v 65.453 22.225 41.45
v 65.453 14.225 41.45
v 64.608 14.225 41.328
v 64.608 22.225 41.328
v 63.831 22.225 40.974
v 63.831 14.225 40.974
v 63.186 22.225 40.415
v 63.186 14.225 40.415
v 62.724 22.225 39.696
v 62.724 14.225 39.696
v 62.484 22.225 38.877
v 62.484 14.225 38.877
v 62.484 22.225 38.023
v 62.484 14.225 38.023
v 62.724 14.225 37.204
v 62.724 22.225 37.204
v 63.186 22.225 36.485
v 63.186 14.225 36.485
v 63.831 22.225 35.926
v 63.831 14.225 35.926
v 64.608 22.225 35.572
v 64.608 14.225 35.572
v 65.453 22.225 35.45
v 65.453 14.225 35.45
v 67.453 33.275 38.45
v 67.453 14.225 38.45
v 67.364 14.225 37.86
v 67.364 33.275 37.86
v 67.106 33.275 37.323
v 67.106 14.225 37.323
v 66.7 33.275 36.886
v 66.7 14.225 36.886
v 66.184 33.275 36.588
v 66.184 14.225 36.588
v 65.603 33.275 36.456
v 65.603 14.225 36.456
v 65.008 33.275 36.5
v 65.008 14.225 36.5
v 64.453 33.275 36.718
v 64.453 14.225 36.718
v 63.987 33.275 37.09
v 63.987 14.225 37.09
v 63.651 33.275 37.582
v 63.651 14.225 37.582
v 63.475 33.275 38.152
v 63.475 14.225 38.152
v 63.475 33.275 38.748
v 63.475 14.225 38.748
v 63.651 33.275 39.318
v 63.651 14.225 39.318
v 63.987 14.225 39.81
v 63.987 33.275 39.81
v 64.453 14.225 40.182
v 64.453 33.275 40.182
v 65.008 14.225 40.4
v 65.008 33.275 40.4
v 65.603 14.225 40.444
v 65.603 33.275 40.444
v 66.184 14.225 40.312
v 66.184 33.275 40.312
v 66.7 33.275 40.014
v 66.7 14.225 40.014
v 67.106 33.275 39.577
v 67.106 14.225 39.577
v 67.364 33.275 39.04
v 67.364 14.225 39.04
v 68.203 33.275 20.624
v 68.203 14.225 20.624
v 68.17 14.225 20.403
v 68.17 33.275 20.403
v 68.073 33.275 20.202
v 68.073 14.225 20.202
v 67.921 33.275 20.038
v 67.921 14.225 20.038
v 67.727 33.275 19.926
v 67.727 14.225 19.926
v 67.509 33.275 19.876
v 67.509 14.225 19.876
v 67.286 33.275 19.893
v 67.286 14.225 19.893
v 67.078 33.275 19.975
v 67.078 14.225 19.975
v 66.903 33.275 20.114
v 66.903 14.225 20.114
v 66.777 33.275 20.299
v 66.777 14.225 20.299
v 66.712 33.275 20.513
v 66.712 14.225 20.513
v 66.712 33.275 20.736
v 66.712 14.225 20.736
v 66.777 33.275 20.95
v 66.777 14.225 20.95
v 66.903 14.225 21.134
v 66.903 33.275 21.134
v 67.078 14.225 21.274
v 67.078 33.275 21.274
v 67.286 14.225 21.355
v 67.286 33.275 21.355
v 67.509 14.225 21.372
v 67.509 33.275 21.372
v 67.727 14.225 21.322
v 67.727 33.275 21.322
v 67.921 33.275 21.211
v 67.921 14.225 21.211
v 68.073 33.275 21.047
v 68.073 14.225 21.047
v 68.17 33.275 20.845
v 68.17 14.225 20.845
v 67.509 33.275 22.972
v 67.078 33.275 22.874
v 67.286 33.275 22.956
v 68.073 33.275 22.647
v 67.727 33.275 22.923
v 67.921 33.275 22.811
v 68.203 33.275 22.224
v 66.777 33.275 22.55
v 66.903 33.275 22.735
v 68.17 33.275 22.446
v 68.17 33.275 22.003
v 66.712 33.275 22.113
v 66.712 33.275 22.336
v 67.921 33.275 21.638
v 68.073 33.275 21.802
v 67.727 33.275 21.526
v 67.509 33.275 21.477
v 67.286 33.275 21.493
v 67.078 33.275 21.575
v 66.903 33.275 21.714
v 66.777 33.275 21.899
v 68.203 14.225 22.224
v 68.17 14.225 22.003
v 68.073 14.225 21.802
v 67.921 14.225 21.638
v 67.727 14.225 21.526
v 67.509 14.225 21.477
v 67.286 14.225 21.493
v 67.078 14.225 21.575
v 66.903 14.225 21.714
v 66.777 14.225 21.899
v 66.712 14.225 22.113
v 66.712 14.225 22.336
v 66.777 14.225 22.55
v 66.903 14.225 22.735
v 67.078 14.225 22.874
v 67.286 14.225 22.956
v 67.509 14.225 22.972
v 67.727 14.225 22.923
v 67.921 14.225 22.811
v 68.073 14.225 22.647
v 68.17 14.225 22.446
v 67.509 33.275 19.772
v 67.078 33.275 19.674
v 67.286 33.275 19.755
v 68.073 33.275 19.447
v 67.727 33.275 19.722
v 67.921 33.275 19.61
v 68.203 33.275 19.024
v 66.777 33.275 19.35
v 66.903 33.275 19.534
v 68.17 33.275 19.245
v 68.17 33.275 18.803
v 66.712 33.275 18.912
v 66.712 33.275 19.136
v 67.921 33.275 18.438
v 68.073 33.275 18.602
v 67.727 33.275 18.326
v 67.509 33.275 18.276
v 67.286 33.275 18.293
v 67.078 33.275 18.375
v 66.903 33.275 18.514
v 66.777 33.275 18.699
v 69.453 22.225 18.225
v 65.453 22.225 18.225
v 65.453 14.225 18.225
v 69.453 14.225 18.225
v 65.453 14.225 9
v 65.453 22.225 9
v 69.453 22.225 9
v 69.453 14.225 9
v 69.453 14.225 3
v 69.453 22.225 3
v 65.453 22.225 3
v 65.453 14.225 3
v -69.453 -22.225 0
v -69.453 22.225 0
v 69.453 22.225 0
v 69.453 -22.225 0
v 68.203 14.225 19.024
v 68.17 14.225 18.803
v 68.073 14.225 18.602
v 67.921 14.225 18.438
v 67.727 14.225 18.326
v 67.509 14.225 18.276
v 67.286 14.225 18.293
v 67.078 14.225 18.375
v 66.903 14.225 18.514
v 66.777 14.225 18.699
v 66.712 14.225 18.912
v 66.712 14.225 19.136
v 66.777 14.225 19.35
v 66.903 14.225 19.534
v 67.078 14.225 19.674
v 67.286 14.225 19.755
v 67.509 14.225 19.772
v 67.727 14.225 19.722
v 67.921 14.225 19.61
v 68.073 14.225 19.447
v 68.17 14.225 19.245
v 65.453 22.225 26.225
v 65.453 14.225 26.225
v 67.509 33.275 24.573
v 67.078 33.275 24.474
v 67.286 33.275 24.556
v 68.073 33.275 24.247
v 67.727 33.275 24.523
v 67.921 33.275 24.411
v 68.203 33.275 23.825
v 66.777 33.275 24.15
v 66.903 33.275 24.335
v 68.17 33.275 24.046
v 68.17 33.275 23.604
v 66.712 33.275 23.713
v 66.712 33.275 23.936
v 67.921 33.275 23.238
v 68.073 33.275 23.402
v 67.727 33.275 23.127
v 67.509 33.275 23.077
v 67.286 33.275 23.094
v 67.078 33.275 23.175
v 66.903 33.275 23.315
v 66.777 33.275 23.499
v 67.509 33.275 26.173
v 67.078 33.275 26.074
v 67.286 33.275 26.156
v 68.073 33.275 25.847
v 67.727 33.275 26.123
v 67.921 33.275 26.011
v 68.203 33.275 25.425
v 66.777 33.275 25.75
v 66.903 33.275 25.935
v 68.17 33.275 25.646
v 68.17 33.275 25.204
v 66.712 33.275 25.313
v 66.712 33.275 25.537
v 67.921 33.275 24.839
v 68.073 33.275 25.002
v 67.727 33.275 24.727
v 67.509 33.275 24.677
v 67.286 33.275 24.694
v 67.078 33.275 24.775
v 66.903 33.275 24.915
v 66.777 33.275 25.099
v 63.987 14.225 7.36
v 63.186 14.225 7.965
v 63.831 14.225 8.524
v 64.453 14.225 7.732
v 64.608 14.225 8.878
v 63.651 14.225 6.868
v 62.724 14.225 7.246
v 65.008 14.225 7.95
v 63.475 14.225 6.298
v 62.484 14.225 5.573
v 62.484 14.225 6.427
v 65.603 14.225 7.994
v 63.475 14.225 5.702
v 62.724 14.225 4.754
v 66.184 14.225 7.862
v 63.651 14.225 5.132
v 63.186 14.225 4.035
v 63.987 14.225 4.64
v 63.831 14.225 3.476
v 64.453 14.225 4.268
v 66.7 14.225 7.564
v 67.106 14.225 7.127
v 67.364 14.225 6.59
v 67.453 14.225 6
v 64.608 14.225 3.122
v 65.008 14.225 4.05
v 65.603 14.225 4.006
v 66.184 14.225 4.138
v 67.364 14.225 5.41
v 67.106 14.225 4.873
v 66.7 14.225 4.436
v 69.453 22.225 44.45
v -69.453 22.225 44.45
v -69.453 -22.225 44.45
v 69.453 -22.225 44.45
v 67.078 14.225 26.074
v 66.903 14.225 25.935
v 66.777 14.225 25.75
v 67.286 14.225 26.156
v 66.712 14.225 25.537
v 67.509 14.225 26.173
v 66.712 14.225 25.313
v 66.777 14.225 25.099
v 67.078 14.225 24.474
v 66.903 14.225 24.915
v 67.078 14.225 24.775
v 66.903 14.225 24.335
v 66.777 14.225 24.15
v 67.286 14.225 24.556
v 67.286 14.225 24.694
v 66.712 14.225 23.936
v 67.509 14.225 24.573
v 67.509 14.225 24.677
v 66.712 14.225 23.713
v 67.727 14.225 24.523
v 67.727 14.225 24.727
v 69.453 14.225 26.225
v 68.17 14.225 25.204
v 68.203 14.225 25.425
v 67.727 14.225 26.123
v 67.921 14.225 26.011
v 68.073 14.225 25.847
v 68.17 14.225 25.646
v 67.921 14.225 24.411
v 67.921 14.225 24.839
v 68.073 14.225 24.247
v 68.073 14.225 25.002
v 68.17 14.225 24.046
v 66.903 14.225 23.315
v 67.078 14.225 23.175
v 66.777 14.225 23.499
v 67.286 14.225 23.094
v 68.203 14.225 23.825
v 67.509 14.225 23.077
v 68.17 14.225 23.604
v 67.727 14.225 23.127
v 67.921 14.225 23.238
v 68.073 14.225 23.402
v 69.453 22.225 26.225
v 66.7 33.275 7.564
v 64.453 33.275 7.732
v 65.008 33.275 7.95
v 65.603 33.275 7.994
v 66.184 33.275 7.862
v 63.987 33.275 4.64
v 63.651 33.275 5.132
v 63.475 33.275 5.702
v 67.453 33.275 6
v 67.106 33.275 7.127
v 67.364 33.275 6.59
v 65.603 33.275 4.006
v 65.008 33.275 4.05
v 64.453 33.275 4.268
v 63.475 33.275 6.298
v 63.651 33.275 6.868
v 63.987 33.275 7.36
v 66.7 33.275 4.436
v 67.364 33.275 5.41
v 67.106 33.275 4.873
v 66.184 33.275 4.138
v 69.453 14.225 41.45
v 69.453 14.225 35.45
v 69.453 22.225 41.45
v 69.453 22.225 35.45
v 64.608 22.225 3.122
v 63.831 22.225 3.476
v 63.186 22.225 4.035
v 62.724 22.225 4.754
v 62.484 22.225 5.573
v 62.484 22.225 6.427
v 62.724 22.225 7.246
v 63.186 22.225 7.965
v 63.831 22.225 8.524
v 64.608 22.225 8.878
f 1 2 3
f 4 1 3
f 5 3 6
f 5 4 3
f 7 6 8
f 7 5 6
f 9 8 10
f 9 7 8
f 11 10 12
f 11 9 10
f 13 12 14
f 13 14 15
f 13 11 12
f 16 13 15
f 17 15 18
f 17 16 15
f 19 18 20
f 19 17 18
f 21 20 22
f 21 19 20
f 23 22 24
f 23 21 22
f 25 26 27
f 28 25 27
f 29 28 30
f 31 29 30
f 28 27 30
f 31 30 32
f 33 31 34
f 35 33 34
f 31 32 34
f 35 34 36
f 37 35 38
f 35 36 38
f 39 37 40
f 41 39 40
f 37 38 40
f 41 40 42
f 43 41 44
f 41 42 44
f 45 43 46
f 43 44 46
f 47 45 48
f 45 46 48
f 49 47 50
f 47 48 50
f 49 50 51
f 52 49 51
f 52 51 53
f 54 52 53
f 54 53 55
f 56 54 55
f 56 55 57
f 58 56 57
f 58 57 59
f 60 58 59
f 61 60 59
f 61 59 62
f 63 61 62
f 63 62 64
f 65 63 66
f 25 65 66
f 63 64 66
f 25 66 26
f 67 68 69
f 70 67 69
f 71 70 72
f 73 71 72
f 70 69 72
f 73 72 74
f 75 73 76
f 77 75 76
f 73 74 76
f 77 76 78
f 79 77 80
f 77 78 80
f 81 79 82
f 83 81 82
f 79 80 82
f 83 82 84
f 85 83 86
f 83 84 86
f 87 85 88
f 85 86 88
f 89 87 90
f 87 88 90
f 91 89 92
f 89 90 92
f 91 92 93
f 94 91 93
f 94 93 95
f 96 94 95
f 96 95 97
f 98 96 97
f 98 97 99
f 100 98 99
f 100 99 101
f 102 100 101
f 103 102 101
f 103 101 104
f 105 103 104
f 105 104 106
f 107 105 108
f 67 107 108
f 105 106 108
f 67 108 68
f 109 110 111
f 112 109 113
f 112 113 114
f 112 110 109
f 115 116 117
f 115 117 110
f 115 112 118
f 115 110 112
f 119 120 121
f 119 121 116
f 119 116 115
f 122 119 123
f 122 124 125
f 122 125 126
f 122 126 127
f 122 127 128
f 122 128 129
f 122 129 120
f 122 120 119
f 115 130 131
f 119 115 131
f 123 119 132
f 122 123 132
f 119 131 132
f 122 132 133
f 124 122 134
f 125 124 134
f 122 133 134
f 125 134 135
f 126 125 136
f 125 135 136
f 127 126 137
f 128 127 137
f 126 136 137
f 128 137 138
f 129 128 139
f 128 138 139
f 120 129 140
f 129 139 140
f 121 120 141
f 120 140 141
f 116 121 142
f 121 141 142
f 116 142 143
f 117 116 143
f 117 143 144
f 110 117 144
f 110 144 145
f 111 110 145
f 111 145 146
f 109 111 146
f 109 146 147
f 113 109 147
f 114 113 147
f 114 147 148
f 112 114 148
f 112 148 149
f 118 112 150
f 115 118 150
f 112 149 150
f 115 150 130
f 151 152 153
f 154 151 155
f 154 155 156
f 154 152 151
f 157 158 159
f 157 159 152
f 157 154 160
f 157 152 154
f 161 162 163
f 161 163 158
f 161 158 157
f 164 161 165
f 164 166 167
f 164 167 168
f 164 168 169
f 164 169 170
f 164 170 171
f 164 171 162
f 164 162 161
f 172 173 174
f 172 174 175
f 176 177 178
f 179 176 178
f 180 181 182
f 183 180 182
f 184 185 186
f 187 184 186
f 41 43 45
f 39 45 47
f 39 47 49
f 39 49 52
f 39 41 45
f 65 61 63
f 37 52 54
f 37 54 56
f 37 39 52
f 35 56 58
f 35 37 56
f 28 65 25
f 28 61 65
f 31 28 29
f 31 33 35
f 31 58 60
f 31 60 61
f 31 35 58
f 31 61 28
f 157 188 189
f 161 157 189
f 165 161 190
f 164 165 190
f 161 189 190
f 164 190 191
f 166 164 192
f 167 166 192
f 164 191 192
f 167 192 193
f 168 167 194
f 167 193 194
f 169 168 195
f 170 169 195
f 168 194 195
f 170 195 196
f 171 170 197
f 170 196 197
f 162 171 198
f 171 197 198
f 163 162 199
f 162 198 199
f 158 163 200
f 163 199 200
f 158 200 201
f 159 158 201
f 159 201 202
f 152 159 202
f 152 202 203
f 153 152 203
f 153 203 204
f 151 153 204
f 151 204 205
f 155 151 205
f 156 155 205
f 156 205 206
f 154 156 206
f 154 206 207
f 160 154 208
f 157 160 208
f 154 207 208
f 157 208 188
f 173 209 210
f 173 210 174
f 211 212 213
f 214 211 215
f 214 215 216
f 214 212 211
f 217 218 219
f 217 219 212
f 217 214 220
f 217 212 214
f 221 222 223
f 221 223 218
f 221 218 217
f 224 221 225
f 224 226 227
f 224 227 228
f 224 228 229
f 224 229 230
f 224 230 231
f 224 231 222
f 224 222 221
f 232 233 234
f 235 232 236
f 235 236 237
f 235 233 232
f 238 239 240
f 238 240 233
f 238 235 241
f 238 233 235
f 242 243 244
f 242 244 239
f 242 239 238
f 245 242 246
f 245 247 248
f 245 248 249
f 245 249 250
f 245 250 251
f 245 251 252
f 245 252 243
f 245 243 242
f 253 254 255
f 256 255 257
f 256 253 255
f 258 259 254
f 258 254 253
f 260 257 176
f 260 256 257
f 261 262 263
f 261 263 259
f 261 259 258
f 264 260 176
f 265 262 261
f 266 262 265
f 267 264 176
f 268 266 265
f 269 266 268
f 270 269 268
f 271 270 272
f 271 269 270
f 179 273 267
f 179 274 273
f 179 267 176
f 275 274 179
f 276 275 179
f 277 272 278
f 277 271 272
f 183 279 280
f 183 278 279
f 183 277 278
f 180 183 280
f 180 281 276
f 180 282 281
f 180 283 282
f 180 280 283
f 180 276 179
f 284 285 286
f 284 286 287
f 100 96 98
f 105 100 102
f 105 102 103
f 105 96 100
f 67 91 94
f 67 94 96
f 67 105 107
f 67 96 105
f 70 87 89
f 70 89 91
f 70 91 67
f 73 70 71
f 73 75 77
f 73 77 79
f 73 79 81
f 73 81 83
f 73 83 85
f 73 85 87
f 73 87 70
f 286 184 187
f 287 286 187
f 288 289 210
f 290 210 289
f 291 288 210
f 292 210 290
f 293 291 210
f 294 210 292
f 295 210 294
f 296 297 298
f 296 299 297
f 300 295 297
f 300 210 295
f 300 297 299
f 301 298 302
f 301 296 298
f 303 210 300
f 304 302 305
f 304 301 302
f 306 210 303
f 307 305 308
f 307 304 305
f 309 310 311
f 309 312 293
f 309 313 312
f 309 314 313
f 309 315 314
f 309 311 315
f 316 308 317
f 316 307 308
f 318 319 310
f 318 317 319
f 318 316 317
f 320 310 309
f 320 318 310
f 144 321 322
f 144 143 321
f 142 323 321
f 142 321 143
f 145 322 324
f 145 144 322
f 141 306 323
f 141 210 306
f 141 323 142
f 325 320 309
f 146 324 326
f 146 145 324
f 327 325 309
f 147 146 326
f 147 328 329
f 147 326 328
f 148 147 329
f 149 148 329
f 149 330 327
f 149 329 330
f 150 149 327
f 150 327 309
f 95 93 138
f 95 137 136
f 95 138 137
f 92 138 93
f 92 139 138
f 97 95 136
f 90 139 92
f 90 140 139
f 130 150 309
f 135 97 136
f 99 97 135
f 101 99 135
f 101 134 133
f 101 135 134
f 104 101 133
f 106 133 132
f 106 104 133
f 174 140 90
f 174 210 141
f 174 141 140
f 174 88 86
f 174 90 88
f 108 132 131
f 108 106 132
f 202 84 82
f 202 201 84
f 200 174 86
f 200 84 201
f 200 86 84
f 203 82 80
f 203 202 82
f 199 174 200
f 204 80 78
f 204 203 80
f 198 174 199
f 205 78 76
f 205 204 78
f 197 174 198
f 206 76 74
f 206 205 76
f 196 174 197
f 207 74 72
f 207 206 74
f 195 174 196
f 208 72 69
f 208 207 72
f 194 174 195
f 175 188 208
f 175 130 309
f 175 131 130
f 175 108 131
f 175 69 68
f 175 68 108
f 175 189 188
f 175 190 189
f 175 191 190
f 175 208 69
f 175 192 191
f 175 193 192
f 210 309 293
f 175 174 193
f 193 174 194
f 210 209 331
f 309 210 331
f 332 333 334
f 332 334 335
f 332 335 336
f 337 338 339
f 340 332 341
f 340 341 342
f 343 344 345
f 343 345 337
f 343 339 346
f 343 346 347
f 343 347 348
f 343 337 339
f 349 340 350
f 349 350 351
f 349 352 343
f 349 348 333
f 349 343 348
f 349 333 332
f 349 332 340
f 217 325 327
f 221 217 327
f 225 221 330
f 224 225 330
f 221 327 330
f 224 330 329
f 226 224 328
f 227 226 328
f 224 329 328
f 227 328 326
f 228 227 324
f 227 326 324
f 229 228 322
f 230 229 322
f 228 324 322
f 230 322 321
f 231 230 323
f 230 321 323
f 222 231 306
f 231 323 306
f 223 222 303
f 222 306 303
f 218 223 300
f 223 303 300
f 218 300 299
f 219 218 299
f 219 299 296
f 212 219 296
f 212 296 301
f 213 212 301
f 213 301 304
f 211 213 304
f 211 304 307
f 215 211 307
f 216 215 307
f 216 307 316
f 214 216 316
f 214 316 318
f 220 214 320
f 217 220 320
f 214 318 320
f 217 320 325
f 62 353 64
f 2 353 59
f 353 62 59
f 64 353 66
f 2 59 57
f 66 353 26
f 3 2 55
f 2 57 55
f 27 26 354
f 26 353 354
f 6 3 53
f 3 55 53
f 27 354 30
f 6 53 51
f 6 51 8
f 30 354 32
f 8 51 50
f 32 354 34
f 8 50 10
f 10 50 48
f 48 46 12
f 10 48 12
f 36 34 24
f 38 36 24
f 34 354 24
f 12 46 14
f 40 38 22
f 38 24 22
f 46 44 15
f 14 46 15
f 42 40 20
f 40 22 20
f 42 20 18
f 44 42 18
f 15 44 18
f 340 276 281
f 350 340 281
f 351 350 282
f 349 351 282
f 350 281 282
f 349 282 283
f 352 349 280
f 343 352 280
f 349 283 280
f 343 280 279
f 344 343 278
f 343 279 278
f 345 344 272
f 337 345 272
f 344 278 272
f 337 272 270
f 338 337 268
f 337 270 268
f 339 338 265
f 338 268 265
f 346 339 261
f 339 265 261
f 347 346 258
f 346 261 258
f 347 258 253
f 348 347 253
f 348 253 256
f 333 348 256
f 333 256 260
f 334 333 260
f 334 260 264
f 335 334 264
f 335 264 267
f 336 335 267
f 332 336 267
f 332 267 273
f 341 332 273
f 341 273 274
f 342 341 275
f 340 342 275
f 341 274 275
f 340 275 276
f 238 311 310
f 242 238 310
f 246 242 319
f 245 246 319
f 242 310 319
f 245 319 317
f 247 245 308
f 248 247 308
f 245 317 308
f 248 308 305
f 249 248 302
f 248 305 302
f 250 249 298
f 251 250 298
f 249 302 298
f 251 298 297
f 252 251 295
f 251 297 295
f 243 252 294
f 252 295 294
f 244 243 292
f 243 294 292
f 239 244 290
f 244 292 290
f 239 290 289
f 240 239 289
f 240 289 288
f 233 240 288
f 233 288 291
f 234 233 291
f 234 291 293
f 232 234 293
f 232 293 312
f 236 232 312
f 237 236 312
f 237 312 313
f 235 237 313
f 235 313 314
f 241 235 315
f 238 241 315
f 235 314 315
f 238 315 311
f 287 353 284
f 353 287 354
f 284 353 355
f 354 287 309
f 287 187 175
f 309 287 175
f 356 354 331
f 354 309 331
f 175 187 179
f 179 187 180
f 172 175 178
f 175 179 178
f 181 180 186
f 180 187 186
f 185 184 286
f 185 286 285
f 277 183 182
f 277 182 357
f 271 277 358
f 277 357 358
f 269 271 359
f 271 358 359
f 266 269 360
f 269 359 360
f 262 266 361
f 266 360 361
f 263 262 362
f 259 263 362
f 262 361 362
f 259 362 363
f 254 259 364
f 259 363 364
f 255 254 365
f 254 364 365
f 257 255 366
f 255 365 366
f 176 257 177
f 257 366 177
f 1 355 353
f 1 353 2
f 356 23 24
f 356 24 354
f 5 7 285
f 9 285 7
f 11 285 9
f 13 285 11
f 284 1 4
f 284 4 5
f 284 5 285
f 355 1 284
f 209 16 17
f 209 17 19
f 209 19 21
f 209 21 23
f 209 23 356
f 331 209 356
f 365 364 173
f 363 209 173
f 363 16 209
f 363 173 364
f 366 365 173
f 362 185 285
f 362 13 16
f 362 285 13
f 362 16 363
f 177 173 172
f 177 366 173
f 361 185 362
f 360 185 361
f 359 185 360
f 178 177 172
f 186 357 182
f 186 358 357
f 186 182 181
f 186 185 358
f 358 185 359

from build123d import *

# Parameters (mm, degrees)
SKETCH1_W           = 138.90625
SKETCH1_H           = 44.45
BOSS_EXTRUDE1_DEPTH = 44.45
SKETCH2_W           = 4
SKETCH2_H           = 8
CUT_EXTRUDE1_DEPTH  = 8
SKETCH3_R           = 2
SKETCH3_R_2         = 0.75
BOSS_EXTRUDE2_DEPTH = 19.05


with BuildPart() as part:
    # Sketch1 → Boss-Extrude1 (new body)
    with BuildSketch(Plane.XY):
        Rectangle(SKETCH1_W, SKETCH1_H)
    extrude(amount=BOSS_EXTRUDE1_DEPTH)

    # Sketch2 → Cut-Extrude1 (cut)
    with BuildSketch(Plane(origin=(0, 22.225, 0), x_dir=(1, 0, 0), z_dir=(0, 1, 0))):
        with BuildLine():
            Line((65.453125, -35.45), (69.453125, -35.45))
            Line((69.453125, -35.45), (69.453125, -41.45))
            Line((69.453125, -41.45), (65.453125, -41.45))
            ThreePointArc((65.453125, -41.45), (62.453125, -38.45), (65.453125, -35.45))
        make_face()
        with BuildLine():
            Line((69.453125, -3), (65.453125, -3))
            ThreePointArc((65.453125, -3), (62.453125, -6), (65.453125, -9))
            Line((65.453125, -9), (69.453125, -9))
            Line((69.453125, -9), (69.453125, -3))
        make_face()
        with Locations((67.453125, -22.225)):
            Rectangle(SKETCH2_W, SKETCH2_H)
    extrude(amount=-CUT_EXTRUDE1_DEPTH, mode=Mode.SUBTRACT)

    # Sketch3 → Boss-Extrude2 (add)
    with BuildSketch(Plane(origin=(0, 14.225, 0), x_dir=(1, 0, 0), z_dir=(0, 1, 0))):
        with Locations((65.453125, -38.45)):
            Circle(SKETCH3_R)
        with Locations((65.453125, -6)):
            Circle(SKETCH3_R)
        with Locations((67.453125, -19.0241)):
            Circle(SKETCH3_R_2)
        with Locations((67.453125, -20.6243)):
            Circle(SKETCH3_R_2)
        with Locations((67.453125, -22.2245)):
            Circle(SKETCH3_R_2)
        with Locations((67.453125, -23.8247)):
            Circle(SKETCH3_R_2)
        with Locations((67.453125, -25.4249)):
            Circle(SKETCH3_R_2)
    extrude(amount=BOSS_EXTRUDE2_DEPTH)


solid = part.part
